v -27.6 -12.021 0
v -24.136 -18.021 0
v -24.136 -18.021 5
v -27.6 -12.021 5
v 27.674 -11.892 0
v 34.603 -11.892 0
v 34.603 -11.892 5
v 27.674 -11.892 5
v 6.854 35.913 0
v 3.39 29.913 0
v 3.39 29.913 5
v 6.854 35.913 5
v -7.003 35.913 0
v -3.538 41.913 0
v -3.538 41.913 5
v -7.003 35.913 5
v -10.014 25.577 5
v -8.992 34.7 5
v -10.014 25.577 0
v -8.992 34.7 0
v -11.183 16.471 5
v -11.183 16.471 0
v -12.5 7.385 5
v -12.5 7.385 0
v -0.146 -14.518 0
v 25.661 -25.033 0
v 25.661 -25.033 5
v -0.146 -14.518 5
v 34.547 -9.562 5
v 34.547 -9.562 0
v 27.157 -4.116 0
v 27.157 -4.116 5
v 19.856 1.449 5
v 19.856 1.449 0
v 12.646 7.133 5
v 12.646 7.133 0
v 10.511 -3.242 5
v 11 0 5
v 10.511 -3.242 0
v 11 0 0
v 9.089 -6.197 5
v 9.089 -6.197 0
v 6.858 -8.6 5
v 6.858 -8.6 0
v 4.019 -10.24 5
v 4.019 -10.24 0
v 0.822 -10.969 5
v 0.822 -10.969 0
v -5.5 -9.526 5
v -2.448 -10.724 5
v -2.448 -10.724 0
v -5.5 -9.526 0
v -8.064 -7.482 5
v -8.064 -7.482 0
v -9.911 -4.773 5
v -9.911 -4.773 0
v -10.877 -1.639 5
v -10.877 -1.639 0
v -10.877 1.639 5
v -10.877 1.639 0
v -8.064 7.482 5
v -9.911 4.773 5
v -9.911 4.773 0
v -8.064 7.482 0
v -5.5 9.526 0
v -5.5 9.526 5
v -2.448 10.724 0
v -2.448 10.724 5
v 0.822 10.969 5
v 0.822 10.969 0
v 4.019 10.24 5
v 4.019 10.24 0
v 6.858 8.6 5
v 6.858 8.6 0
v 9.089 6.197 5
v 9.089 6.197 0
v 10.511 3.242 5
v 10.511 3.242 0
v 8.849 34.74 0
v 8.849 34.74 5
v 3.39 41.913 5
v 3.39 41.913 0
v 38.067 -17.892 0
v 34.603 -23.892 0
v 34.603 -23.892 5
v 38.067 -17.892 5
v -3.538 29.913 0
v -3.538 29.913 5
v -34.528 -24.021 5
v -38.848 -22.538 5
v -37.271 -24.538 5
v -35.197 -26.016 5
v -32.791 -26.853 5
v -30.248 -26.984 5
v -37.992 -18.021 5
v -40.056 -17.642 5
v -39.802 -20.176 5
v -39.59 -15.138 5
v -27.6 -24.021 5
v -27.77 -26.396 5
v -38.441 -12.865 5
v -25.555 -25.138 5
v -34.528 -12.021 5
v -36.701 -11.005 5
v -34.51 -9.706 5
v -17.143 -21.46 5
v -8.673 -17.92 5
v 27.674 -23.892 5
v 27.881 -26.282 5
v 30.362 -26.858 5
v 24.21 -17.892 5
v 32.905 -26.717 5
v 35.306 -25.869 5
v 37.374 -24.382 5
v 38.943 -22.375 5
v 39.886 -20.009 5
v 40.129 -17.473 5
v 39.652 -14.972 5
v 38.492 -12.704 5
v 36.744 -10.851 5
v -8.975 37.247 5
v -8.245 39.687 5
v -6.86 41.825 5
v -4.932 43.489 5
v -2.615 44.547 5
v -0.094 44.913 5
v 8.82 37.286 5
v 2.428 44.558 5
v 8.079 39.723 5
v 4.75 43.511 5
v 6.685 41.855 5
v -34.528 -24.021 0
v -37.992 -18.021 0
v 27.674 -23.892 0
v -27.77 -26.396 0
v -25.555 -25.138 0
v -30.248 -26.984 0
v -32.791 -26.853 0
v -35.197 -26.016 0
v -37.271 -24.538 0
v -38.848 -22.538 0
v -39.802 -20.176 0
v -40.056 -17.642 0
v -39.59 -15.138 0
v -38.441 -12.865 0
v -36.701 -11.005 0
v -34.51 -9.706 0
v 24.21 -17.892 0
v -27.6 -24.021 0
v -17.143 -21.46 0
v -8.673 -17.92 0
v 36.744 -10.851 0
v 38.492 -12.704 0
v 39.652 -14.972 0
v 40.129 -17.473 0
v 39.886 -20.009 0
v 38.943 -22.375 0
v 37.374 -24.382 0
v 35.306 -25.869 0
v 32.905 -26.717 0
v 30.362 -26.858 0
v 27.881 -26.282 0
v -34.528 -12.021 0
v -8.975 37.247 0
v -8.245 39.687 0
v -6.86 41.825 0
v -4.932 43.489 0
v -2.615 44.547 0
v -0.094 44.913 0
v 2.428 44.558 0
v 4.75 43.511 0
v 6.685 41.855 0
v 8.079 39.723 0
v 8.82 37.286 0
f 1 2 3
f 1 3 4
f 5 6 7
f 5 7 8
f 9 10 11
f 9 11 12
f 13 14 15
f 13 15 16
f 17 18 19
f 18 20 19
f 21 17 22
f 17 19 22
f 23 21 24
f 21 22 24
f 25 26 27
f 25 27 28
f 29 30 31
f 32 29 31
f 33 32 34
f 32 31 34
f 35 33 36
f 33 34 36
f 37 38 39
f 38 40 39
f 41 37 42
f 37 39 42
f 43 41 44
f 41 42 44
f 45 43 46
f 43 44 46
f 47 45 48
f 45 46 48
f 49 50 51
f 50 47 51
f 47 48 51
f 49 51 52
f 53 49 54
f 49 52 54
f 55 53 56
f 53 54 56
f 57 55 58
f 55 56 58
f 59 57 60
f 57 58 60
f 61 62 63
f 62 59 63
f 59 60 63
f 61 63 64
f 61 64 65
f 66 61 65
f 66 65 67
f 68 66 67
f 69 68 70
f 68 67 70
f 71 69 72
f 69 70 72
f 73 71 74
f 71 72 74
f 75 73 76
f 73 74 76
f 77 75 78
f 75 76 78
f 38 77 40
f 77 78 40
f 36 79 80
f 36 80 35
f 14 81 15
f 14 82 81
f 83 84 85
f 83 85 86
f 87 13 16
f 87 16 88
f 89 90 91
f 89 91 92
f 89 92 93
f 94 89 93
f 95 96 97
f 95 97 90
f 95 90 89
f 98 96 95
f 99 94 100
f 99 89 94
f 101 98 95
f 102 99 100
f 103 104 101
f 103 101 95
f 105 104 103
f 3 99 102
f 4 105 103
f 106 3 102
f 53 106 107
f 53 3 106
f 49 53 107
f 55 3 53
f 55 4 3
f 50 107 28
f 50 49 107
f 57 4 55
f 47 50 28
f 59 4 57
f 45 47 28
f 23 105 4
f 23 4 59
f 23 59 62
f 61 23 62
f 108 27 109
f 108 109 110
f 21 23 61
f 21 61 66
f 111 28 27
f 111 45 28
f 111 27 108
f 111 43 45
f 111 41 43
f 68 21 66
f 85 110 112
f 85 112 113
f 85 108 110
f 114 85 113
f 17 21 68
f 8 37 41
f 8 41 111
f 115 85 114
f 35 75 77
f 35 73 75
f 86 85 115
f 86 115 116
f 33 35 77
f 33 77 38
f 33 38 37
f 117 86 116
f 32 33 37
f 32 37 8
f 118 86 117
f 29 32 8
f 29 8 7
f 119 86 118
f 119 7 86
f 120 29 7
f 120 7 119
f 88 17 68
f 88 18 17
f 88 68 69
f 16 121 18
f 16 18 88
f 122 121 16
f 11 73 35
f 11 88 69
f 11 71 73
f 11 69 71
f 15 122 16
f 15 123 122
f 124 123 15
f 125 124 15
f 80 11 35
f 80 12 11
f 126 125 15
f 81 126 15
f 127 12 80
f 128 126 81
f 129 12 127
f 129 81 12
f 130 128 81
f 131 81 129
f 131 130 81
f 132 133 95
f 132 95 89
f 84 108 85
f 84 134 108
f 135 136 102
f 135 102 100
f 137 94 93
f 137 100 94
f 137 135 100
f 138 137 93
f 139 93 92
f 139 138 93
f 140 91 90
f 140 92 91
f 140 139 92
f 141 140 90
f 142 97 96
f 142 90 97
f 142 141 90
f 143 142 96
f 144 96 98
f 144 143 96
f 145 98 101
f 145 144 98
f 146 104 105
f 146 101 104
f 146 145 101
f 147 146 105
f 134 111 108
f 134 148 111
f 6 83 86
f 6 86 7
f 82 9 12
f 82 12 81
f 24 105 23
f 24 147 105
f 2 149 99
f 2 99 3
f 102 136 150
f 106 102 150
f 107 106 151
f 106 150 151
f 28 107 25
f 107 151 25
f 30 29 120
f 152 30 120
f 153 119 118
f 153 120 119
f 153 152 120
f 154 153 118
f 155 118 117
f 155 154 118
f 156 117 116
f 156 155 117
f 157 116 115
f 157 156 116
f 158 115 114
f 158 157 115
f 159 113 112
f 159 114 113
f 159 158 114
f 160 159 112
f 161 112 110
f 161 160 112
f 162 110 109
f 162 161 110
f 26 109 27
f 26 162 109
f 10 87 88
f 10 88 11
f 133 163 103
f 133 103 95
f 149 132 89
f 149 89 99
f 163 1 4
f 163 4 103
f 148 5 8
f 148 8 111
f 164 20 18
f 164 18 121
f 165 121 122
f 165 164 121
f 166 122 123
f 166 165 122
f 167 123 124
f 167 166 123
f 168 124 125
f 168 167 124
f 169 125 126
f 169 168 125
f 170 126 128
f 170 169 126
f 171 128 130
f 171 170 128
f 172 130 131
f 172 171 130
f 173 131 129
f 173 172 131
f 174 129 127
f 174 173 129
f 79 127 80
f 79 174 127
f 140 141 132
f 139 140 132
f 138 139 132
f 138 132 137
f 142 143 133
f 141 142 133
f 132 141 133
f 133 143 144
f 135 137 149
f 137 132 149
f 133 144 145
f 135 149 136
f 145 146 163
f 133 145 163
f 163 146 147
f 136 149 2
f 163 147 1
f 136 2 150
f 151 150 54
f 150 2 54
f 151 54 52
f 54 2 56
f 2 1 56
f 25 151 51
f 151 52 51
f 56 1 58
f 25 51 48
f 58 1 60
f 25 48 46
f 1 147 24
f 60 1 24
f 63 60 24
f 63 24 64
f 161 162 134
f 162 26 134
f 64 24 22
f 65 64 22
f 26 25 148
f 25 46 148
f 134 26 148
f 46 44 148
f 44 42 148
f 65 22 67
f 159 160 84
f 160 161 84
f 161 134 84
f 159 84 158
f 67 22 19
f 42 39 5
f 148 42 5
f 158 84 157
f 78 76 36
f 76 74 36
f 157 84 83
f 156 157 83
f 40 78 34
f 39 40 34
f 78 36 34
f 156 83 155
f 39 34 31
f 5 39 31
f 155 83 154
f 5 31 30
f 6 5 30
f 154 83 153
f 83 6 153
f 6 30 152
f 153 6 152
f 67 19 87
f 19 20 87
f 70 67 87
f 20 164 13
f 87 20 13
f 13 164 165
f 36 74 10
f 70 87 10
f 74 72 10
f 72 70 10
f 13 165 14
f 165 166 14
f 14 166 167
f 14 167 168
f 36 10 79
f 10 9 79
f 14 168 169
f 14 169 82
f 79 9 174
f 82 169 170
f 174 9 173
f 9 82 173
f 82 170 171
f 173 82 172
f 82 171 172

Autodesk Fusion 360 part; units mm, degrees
sketch "Sketch1" plane through (0, 0, 0) normal (0, 0, 1) x (1, 0, 0)
  circle A0 centre (0, 0) radius 11
  circle A1 centre (0, 0) radius 13.5
  circle A2 centre (0, 0) radius 45 construction
  circle A3 centre (-0.0744, 35.9127) radius 9
  arc A4 (-13.3245, 2.1699) -> (-8.9923, 34.7002) centre (-571.0597, 92.9983) ccw
  line L0 (8.8488, 34.7395) -> (13.3741, 1.8396)
  line L1 (-3.5385, 41.9127) -> (-7.0026, 35.9127)
  line L2 (-7.0026, 35.9127) -> (-3.5385, 29.9127)
  line L3 (-3.5385, 29.9127) -> (3.3897, 29.9127)
  line L4 (3.3897, 29.9127) -> (6.8538, 35.9127)
  line L5 (6.8538, 35.9127) -> (3.3897, 41.9127)
  line L6 (3.3897, 41.9127) -> (-3.5385, 41.9127)
  line L7 (-27.6, -24.0208) -> (-24.1359, -18.0208)
  line L8 (-34.5282, -24.0208) -> (-27.6, -24.0208)
  line L9 (-24.1359, -18.0208) -> (-27.6, -12.0208)
  circle A5 centre (-31.0641, -18.0208) radius 9
  line L10 (-34.5282, -12.0208) -> (-37.9923, -18.0208)
  arc A6 (4.783, -12.6243) -> (-25.5551, -25.1377) centre (204.991, -541.0514) ccw
  line L11 (-27.6, -12.0208) -> (-34.5282, -12.0208)
  line L12 (-34.5097, -9.7065) -> (-8.2801, 10.6625)
  line L13 (-37.9923, -18.0208) -> (-34.5282, -24.0208)
  line L14 (34.6026, -11.8919) -> (27.6744, -11.8919)
  line L15 (38.0667, -17.8919) -> (34.6026, -11.8919)
  line L16 (27.6744, -11.8919) -> (24.2103, -17.8919)
  circle A7 centre (31.1385, -17.8919) radius 9
  line L17 (27.6744, -23.8919) -> (34.6026, -23.8919)
  arc A8 (8.5414, 10.4544) -> (34.5474, -9.5625) centre (366.0688, 448.0531) ccw
  line L18 (24.2103, -17.8919) -> (27.6744, -23.8919)
  line L19 (25.6609, -25.0331) -> (-5.0939, -12.5021)
  line L20 (34.6026, -23.8919) -> (38.0667, -17.8919)
  point P0 (-0.0744, 35.9127)
  point P1 (-31.0641, -18.0208)
  point P2 (31.1385, -17.8919)
  dimension "d1" = 22
  dimension "d2" = 27
  dimension "d4" = 90
  dimension "d5" = 18
  dimension "d6" = 6
  dimension "d8" = 360
extrude "Extrude1" add sketch "Sketch1" along normal blind 5
